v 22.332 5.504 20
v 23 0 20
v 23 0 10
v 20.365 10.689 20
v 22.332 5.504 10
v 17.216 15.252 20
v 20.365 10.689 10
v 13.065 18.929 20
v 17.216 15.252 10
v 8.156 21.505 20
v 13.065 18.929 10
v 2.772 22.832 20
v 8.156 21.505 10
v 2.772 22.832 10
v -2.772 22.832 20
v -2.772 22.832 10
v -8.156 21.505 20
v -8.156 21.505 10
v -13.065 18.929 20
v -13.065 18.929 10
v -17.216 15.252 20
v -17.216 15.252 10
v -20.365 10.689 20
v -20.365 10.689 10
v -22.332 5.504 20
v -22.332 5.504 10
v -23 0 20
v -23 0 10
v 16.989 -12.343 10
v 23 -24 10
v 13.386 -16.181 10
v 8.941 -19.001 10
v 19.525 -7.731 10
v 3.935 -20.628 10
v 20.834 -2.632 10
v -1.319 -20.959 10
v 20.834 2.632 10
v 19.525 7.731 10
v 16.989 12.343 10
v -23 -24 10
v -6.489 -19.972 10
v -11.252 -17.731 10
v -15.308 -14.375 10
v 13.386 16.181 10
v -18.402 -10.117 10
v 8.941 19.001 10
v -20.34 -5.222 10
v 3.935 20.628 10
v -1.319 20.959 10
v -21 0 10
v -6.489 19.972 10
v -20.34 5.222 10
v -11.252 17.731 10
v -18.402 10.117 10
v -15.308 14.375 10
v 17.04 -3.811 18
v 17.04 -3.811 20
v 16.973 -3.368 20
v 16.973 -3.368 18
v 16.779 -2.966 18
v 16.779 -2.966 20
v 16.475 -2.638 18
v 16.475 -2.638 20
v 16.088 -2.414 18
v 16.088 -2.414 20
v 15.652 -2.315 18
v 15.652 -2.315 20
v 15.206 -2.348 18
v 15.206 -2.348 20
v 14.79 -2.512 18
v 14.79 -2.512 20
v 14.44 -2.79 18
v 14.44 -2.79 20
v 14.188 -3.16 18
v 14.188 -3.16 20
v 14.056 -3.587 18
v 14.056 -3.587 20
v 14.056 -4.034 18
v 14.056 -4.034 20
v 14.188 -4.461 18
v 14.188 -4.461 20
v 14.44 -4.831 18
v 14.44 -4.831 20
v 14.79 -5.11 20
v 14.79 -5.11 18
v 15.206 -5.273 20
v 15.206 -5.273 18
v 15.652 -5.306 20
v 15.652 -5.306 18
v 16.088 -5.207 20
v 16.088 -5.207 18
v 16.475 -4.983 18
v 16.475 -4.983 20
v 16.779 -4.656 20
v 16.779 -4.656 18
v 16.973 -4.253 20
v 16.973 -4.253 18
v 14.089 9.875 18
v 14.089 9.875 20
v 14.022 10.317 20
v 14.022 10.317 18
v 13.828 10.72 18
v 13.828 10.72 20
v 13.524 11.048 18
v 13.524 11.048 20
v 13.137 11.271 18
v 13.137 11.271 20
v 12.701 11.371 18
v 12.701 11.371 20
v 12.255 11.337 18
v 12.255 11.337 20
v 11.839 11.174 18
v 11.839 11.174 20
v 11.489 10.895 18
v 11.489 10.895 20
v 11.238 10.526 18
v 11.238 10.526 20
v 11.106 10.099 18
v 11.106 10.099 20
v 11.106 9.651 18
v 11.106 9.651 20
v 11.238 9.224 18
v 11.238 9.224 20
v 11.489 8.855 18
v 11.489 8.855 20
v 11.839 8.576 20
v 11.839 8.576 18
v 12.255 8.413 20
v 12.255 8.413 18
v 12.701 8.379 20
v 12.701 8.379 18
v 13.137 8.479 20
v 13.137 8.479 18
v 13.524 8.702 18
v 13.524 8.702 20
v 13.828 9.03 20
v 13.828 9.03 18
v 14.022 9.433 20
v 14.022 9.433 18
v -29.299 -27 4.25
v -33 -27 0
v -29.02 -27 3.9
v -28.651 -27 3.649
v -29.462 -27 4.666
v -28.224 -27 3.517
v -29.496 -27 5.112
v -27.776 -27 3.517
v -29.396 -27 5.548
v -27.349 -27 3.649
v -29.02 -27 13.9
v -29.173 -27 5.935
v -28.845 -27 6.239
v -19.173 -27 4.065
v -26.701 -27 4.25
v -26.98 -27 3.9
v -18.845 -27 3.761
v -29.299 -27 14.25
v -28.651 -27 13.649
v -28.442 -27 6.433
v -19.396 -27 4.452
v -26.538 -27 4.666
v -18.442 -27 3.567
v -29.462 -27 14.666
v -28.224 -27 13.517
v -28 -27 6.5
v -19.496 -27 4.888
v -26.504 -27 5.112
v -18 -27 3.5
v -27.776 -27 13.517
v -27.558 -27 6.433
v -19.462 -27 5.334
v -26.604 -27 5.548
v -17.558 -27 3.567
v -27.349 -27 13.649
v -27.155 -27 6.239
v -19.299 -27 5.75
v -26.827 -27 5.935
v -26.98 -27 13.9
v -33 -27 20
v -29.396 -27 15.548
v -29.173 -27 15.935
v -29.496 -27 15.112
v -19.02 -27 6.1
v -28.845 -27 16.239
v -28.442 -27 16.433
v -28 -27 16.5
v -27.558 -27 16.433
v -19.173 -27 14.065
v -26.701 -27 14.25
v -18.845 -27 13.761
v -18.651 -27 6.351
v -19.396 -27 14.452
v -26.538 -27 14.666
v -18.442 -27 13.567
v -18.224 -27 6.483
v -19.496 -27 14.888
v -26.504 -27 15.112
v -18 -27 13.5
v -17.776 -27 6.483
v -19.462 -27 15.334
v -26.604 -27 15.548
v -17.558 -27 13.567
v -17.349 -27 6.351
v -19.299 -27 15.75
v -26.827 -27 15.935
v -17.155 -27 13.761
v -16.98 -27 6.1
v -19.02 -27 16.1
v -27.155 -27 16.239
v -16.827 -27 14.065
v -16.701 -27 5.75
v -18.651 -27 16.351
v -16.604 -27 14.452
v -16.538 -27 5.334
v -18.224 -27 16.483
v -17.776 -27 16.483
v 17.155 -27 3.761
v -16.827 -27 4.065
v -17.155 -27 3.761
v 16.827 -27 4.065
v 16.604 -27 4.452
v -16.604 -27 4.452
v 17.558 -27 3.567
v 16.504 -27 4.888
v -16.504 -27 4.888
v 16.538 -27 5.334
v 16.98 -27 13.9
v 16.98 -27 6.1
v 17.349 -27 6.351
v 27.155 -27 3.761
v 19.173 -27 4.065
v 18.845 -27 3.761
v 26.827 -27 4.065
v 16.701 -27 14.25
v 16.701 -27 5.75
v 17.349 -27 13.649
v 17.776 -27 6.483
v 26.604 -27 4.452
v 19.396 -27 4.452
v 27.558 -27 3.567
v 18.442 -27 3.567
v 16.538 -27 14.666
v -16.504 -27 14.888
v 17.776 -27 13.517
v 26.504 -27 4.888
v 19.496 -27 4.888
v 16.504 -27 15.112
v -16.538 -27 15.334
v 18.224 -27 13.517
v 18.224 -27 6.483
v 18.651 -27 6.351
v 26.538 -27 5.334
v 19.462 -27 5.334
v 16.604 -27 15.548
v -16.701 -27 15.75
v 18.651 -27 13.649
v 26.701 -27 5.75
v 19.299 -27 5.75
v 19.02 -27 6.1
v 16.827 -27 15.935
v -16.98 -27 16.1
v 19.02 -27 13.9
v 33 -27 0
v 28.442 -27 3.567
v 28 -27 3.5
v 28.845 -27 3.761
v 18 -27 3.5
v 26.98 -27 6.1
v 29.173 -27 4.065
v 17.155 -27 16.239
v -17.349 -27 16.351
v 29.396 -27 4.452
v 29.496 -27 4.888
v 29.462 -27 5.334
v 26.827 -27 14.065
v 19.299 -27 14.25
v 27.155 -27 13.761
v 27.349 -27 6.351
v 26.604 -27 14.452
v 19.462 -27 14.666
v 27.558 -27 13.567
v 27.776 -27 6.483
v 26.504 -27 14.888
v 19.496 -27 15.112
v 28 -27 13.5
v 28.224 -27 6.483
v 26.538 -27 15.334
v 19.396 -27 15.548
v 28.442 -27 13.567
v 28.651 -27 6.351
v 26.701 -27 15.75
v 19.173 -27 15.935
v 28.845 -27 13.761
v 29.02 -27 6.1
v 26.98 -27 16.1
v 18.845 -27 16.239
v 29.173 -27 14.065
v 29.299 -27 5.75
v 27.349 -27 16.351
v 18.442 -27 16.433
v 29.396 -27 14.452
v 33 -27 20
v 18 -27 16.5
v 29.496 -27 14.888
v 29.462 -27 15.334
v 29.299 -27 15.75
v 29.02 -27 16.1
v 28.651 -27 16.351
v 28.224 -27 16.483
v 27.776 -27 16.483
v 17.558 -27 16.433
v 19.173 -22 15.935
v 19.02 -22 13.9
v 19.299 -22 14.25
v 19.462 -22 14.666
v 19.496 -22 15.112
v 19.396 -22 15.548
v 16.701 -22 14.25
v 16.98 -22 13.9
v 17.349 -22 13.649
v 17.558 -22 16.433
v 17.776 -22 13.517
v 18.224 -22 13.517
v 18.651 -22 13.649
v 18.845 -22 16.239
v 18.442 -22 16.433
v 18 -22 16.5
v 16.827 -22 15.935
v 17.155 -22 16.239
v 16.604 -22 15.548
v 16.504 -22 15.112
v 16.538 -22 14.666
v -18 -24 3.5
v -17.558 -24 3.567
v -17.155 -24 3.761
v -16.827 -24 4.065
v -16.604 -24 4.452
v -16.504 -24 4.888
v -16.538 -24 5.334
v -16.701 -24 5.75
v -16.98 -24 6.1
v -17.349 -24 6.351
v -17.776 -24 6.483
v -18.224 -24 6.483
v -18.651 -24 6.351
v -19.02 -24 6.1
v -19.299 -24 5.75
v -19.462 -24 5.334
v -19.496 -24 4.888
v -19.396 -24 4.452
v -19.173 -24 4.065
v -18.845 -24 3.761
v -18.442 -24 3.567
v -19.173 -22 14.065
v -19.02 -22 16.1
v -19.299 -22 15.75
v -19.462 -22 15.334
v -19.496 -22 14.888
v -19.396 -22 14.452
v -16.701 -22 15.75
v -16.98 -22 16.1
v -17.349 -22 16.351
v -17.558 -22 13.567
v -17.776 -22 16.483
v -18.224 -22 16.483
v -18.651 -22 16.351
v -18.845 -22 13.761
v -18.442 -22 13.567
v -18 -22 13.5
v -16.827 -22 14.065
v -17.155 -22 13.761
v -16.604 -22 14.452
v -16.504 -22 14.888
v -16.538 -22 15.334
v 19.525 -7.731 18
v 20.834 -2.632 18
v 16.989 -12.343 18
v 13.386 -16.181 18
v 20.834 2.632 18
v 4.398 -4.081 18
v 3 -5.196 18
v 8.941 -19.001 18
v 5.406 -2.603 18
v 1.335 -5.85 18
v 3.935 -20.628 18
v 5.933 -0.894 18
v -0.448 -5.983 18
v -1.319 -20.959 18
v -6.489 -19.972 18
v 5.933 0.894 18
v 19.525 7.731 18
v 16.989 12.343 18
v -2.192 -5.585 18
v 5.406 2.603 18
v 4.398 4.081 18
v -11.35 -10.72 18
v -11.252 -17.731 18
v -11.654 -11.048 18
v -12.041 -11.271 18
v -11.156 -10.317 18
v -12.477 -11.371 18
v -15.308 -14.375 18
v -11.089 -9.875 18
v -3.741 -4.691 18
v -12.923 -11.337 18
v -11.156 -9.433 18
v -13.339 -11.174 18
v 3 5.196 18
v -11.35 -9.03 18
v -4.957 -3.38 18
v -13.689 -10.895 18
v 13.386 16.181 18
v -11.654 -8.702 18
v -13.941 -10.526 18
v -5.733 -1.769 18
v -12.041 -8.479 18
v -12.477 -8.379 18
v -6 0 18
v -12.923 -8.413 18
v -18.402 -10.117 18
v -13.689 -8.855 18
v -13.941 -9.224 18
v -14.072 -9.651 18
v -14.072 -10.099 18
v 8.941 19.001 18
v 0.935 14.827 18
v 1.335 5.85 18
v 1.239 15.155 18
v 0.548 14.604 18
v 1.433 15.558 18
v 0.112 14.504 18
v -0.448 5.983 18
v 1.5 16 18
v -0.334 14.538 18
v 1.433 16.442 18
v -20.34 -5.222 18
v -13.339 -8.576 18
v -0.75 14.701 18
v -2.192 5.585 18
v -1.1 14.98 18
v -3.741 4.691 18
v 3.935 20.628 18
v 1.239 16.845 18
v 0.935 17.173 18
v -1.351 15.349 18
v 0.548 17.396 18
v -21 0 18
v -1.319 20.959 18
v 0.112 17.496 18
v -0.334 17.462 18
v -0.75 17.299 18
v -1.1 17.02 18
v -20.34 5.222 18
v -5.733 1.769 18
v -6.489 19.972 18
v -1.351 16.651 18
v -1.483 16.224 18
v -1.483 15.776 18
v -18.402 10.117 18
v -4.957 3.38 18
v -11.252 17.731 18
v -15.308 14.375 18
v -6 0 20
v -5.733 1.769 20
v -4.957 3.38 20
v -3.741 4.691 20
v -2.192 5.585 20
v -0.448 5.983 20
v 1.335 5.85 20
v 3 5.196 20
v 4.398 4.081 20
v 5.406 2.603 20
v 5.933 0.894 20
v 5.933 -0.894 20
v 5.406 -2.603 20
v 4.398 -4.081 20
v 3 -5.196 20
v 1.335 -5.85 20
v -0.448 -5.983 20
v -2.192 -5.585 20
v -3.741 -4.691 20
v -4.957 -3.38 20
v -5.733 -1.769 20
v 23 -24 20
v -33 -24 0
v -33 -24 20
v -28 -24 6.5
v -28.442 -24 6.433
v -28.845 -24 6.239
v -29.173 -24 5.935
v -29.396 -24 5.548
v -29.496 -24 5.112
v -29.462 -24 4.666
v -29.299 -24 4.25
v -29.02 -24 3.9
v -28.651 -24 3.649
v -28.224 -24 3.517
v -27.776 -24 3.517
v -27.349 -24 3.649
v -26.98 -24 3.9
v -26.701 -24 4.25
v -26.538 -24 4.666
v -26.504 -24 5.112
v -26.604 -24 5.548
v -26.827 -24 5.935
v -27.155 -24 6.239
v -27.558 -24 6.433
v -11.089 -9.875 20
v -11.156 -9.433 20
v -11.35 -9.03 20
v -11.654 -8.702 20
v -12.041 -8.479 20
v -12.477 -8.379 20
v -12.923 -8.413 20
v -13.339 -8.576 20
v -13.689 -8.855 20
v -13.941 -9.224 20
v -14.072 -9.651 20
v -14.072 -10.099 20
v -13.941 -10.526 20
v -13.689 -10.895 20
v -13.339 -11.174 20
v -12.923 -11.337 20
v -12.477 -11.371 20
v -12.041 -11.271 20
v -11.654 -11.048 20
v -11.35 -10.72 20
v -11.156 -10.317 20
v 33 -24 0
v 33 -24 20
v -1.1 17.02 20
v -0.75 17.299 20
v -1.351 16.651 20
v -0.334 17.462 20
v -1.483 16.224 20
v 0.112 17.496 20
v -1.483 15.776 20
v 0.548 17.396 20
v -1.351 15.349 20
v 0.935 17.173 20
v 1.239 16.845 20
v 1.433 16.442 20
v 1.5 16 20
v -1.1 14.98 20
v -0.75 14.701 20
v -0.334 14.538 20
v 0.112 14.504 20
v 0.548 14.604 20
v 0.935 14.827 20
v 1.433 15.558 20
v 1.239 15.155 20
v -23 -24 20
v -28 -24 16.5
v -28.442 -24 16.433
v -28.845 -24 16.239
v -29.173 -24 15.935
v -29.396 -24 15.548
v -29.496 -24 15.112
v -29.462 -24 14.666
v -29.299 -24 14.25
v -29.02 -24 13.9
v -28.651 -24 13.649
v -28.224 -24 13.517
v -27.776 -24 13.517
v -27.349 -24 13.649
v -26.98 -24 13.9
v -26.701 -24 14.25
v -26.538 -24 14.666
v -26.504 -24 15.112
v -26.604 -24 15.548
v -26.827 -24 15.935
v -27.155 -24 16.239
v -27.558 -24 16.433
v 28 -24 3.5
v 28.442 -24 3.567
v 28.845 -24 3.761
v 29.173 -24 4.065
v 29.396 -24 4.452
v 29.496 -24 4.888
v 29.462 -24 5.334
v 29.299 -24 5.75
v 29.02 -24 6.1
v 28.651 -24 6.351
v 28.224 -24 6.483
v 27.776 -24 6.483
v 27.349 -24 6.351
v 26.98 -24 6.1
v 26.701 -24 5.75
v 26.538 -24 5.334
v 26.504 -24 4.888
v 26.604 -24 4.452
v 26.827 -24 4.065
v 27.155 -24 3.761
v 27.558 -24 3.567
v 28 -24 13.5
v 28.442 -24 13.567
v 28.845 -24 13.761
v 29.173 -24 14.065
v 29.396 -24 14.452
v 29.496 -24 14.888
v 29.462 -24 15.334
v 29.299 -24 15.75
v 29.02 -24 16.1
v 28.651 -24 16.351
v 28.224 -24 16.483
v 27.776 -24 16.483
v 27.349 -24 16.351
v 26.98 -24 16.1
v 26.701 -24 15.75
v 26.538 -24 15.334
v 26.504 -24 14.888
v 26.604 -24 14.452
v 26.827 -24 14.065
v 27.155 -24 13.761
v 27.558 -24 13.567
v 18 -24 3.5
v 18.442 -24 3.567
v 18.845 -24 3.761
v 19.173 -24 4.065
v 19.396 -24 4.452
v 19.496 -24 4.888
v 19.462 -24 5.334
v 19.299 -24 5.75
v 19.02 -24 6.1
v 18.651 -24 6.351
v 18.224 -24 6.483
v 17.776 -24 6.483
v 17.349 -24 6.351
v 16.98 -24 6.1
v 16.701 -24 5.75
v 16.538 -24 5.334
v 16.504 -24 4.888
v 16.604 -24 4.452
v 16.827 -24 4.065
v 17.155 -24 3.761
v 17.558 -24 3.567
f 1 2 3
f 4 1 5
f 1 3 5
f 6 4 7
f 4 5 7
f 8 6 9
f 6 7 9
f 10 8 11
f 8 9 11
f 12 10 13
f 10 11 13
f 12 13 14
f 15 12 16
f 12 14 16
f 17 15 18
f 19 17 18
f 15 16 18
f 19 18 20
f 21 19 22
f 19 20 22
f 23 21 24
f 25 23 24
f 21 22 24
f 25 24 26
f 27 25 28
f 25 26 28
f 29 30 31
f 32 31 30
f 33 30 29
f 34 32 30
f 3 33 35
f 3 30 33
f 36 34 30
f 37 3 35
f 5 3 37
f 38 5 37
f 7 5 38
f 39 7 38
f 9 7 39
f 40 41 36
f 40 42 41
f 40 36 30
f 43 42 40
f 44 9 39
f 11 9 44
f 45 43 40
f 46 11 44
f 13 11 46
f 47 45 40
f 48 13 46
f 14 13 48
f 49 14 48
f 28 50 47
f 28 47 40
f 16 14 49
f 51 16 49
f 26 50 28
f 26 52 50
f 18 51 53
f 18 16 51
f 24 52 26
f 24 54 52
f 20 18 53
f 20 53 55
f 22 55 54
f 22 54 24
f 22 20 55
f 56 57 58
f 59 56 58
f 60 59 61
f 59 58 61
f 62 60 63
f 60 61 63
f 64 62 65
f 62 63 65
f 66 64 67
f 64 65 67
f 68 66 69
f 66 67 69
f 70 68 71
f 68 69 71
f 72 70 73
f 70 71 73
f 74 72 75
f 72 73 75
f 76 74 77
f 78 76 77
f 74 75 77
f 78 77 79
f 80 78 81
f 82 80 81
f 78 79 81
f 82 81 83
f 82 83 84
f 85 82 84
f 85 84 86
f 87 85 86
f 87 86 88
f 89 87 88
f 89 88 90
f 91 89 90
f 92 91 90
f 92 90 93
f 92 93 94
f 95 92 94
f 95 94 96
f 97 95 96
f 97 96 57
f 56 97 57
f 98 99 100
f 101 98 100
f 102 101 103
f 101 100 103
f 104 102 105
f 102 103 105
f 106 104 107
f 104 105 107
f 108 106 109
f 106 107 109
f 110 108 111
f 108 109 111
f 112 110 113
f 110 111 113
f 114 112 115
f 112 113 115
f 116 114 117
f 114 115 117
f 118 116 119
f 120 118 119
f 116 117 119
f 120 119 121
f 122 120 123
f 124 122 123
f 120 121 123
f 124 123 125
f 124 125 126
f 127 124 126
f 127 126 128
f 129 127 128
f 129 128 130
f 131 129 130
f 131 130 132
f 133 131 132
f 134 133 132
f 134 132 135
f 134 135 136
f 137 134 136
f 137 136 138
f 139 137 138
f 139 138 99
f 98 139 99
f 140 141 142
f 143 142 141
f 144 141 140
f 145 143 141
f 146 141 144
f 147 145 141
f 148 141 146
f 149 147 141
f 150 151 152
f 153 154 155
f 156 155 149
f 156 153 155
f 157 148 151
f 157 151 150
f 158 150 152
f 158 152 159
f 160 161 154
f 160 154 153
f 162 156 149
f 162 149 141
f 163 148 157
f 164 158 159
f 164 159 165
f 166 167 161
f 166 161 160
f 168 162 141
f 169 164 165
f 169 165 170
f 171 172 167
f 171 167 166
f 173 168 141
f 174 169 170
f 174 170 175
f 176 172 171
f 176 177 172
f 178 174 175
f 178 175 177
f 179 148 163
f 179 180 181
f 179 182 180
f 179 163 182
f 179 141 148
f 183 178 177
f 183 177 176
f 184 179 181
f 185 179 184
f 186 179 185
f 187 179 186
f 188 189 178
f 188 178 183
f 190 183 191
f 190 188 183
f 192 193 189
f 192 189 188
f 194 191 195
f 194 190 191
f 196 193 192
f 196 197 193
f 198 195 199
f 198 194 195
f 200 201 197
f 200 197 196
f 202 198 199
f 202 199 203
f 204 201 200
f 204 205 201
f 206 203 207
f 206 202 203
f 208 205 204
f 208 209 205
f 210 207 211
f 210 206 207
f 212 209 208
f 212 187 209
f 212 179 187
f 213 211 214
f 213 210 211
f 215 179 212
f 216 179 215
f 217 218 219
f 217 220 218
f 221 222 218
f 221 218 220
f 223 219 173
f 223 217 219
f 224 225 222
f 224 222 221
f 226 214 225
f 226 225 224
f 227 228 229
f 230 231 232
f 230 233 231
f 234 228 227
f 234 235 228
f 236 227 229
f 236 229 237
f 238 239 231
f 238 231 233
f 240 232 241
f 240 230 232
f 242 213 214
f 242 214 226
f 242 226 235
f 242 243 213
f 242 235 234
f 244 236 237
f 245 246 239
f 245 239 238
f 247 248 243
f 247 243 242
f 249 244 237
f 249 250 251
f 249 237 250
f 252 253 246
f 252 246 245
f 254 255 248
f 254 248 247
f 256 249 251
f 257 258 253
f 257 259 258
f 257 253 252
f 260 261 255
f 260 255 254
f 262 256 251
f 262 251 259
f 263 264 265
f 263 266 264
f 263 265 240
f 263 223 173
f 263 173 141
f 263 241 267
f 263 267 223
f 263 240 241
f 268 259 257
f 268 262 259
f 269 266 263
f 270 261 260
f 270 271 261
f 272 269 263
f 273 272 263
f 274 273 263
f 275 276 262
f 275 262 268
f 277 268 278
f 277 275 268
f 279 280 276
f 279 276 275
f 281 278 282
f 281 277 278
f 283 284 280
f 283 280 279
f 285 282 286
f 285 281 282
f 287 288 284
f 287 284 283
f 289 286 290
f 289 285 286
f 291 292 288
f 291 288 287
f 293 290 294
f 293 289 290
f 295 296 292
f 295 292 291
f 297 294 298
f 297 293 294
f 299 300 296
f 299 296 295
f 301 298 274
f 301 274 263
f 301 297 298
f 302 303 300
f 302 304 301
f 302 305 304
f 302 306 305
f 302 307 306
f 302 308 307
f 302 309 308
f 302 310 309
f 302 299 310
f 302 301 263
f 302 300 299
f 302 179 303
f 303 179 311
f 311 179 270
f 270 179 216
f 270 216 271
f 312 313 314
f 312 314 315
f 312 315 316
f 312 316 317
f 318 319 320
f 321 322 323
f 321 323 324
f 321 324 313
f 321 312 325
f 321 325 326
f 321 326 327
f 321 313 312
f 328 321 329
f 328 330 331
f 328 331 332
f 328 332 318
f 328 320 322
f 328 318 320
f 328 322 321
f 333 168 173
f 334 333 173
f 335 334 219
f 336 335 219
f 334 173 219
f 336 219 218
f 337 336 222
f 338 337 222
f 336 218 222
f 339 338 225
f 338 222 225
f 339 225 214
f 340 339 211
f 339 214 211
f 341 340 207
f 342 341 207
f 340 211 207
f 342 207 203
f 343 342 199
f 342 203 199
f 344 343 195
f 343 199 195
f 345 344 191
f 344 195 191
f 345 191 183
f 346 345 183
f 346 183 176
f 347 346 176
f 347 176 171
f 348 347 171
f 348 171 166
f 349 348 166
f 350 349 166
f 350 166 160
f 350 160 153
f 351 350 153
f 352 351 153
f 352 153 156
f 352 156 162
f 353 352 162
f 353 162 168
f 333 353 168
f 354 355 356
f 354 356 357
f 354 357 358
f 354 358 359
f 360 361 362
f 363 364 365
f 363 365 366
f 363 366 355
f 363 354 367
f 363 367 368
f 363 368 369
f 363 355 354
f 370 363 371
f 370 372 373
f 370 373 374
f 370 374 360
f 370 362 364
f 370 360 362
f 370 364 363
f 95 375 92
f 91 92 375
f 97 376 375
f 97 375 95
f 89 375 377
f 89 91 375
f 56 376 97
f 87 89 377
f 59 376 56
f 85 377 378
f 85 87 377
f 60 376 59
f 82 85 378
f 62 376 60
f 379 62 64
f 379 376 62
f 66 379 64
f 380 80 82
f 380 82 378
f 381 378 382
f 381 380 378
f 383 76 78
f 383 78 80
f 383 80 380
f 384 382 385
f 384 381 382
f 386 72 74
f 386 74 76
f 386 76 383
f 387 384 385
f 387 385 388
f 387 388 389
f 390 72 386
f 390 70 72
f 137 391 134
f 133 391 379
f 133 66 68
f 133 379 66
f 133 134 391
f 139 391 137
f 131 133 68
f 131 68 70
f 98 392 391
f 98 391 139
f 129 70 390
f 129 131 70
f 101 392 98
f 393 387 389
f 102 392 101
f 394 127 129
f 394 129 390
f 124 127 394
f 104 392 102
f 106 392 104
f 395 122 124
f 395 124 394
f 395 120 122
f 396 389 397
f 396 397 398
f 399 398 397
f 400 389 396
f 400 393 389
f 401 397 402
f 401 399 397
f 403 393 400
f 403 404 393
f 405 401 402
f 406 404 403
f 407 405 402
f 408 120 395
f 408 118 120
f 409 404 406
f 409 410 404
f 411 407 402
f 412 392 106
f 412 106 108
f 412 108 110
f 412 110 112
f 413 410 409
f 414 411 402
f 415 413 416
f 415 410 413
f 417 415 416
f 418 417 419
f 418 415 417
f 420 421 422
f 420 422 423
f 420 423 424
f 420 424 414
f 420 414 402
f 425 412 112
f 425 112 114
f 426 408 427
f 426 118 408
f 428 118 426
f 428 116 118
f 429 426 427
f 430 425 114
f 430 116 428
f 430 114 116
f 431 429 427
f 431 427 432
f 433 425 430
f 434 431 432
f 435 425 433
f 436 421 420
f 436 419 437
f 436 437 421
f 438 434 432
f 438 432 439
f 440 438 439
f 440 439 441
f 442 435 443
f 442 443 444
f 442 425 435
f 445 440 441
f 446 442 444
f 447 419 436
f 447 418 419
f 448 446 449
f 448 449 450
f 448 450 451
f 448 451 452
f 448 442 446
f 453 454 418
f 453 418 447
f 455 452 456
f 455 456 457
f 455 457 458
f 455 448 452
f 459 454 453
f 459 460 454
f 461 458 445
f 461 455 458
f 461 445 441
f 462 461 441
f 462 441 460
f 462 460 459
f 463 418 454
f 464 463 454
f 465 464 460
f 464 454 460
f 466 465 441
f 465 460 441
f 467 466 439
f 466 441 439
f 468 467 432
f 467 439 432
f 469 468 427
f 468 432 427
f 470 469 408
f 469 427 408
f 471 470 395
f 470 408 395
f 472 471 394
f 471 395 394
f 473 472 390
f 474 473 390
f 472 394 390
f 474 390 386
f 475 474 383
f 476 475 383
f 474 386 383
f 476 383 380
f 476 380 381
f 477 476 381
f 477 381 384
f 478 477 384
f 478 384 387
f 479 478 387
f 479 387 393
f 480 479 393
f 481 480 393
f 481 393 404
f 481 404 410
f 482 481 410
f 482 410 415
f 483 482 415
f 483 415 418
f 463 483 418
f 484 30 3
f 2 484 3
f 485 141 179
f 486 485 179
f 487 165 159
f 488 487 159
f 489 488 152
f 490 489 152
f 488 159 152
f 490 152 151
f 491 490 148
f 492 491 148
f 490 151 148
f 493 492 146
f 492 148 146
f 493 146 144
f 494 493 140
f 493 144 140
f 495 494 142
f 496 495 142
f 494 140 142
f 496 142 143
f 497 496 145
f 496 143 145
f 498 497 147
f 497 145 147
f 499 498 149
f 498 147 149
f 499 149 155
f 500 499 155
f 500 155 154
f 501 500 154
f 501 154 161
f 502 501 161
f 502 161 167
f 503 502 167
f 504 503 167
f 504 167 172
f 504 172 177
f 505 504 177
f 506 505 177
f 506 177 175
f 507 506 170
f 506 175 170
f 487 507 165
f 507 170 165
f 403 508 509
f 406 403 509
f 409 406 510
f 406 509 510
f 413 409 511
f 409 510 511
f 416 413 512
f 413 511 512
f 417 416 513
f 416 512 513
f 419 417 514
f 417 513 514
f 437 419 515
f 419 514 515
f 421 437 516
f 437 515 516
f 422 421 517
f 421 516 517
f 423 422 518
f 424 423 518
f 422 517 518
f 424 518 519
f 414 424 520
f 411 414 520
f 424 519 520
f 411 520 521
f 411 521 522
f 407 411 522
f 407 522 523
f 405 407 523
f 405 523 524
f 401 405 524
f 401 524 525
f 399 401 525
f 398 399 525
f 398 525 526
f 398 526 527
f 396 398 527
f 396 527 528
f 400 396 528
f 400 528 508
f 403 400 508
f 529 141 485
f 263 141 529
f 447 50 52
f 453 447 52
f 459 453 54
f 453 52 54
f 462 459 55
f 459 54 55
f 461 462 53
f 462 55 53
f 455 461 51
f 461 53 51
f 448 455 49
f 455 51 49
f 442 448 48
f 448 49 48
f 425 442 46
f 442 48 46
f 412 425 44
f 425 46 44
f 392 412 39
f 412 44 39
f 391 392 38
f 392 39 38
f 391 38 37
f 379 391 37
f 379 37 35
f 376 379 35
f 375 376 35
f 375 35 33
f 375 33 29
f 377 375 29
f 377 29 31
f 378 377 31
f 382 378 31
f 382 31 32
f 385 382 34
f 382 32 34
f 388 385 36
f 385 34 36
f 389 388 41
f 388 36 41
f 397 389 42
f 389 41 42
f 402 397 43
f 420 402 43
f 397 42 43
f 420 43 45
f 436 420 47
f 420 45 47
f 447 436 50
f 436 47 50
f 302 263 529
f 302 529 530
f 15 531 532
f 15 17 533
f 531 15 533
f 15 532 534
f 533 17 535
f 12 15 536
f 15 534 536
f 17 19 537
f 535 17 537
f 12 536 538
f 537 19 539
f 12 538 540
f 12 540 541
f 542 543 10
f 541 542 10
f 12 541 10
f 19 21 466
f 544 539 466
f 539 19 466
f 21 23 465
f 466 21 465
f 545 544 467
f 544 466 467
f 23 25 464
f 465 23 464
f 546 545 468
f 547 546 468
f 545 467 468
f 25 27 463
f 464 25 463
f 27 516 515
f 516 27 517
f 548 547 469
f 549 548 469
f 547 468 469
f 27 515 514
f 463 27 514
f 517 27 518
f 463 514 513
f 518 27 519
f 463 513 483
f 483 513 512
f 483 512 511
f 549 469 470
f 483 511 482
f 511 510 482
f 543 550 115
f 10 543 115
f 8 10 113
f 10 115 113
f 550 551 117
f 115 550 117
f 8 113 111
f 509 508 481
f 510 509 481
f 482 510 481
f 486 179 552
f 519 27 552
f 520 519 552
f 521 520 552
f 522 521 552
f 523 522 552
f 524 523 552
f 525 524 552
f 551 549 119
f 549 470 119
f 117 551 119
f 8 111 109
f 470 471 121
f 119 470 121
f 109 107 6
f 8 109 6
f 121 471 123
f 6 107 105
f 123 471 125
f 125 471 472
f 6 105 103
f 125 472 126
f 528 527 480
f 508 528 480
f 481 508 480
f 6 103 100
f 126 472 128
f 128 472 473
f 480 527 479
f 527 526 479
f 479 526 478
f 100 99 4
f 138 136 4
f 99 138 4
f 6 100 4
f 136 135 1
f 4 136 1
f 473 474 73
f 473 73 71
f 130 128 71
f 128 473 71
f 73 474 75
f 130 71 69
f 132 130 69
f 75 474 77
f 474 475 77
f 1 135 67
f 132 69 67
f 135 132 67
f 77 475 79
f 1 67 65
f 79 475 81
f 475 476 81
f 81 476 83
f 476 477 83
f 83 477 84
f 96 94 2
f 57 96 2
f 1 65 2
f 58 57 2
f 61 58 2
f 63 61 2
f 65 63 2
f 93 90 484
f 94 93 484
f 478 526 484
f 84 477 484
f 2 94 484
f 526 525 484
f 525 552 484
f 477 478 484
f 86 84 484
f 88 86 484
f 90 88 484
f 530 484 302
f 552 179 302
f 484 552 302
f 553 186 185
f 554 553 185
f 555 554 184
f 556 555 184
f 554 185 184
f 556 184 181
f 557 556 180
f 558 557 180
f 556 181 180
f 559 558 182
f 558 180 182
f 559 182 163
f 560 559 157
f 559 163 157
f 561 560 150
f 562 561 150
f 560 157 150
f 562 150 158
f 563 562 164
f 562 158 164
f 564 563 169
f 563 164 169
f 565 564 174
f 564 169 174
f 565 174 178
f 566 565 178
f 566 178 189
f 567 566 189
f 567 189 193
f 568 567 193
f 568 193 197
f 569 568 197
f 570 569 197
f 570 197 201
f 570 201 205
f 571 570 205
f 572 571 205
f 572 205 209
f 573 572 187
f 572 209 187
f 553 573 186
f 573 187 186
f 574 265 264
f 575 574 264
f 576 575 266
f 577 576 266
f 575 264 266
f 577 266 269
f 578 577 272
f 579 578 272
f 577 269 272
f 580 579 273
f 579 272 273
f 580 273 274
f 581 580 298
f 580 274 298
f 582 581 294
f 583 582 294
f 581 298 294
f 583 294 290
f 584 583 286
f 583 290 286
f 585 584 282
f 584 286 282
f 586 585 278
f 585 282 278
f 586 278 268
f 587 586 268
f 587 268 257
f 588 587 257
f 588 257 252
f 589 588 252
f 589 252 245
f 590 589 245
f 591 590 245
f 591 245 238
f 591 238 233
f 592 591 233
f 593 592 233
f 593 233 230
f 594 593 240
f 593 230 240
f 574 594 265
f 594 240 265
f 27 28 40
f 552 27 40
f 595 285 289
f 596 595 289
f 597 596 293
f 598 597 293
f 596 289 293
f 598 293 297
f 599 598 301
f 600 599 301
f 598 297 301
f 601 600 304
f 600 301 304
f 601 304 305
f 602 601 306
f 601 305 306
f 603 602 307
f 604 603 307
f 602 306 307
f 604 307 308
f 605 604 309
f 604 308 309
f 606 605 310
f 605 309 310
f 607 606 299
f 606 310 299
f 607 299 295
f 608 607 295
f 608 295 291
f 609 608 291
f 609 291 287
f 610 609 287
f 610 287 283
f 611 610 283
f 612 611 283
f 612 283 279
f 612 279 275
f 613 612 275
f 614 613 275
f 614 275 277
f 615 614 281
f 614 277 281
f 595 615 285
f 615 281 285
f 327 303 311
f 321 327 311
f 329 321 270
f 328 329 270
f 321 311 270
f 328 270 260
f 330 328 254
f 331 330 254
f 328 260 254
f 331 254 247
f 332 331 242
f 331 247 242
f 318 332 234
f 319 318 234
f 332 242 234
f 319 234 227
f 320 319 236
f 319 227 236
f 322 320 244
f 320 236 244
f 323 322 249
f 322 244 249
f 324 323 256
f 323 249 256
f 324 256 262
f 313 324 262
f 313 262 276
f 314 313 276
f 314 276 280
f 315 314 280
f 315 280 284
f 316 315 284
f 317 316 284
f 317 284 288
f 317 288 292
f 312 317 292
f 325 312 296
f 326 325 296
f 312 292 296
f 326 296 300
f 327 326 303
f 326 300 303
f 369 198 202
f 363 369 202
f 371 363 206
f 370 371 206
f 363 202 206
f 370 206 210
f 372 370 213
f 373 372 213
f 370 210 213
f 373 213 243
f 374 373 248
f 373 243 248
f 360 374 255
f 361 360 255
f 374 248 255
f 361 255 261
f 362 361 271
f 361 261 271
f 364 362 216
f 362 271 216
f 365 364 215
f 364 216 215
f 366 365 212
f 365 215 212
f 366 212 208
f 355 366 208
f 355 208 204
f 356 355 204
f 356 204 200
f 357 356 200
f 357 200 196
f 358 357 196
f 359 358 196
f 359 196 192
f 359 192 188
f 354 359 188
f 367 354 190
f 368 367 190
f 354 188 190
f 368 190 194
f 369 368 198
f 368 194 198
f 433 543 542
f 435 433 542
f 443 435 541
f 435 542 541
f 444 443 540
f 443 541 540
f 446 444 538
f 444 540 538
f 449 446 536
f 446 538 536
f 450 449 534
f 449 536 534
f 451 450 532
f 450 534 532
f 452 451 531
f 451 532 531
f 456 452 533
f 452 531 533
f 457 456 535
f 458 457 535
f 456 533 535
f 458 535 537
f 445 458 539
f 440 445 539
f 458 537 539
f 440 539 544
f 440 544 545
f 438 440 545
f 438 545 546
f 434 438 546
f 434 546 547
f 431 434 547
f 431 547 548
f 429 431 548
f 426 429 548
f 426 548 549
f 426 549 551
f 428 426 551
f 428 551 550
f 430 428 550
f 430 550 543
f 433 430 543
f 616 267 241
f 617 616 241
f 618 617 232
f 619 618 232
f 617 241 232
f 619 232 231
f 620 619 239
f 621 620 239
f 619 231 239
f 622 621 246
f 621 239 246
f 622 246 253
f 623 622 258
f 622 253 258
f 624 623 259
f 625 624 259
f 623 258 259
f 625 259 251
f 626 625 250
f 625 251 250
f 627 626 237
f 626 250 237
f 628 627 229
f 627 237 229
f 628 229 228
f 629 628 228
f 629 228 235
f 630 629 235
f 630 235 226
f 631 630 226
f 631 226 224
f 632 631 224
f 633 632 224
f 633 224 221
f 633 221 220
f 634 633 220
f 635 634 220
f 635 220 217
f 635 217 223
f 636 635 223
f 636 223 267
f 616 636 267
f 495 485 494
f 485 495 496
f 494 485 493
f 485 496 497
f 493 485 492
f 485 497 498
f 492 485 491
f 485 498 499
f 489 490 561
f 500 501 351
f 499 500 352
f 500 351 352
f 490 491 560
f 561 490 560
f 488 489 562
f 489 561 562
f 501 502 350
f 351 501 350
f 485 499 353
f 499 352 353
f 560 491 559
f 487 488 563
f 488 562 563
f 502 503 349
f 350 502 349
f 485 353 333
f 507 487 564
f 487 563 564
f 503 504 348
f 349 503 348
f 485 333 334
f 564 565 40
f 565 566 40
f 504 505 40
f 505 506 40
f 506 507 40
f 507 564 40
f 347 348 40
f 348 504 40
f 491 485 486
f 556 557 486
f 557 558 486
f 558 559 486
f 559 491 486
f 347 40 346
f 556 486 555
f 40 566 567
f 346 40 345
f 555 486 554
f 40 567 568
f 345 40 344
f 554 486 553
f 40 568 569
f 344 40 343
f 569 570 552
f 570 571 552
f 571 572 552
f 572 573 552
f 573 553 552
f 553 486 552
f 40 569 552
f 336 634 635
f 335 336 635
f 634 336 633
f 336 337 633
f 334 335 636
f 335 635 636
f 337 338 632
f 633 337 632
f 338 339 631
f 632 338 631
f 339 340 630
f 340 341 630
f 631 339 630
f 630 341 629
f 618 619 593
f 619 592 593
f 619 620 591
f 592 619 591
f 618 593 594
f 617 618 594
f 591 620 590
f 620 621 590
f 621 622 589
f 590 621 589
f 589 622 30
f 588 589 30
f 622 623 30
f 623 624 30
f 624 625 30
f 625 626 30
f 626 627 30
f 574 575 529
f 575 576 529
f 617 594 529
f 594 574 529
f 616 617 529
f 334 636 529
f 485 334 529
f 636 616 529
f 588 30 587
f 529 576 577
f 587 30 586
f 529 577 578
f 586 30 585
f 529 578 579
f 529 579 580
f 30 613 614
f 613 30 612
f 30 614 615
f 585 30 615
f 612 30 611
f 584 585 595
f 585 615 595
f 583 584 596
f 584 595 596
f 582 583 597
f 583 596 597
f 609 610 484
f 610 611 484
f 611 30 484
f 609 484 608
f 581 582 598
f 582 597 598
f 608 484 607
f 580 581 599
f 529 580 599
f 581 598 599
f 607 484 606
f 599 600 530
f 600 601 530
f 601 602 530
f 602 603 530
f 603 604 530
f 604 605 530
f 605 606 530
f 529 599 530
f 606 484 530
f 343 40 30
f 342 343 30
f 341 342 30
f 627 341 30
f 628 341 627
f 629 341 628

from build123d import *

# Parameters (mm, degrees)
EXTRUDE_1_DEPTH     = 20
CUT_EXTRUDE_1_DEPTH = 10
SKETCH_3_R          = 21
CUT_EXTRUDE_2_DEPTH = 8
SKETCH_6_R          = 1.5
CUT_EXTRUDE_3_DEPTH = 5
SKETCH_7_R          = 1.5
CUT_EXTRUDE_6_DEPTH = 3
SKETCH_8_R          = 6
CUT_EXTRUDE_7_DEPTH = 3
SKETCH_9_W          = 10
SKETCH_9_H          = 20
SKETCH_9_R          = 1.5
EXTRUDE_2_DEPTH     = 3


with BuildPart() as part:
    # 草图1 → 凸台-拉伸1 (new body)
    with BuildSketch(Plane.XY):
        with BuildLine():
            Line((-23, 0), (-23, -27))
            Line((-23, -27), (23, -27))
            Line((23, -27), (23, 0))
            ThreePointArc((23, 0), (0, 23), (-23, 0))
        make_face()
    extrude(amount=EXTRUDE_1_DEPTH)

    # 草图2 → 切除-拉伸1 (cut)
    with BuildSketch(Plane(origin=(0, 0, 0), x_dir=(-1, 0, 0), z_dir=(0, 0, -1))):
        with BuildLine():
            Line((-23, -24), (23, -24))
            Line((23, -24), (23, 0))
            ThreePointArc((23, 0), (0, 23), (-23, 0))
            Line((-23, 0), (-23, -24))
        make_face()
    extrude(amount=-CUT_EXTRUDE_1_DEPTH, mode=Mode.SUBTRACT)

    # 草图3 → 切除-拉伸2 (cut)
    with BuildSketch(Plane(origin=(0, 0, 10), x_dir=(-1, 0, 0), z_dir=(0, 0, -1))):
        Circle(SKETCH_3_R)
    extrude(amount=-CUT_EXTRUDE_2_DEPTH, mode=Mode.SUBTRACT)

    # 草图6 → 切除-拉伸3 (cut)
    with BuildSketch(Plane.XZ.offset(27)):
        with Locations(Location((-18, 15, 0), (0, 0, 270))):
            Circle(SKETCH_6_R)
        with Locations(Location((18, 15, 0), (0, 0, 90))):
            Circle(SKETCH_6_R)
        with Locations(Location((18, 5, 0), (0, 0, 270))):
            Circle(SKETCH_6_R)
        with Locations(Location((-18, 5, 0), (0, 0, 270))):
            Circle(SKETCH_6_R)
    extrude(amount=-CUT_EXTRUDE_3_DEPTH, mode=Mode.SUBTRACT)

    # 草图7 → 切除-拉伸6 (cut)
    with BuildSketch(Plane.XY.offset(20)):
        with Locations((0, 16)):
            Circle(SKETCH_7_R)
        with Locations((12.589057749, 9.875)):
            Circle(SKETCH_7_R)
        with Locations((-12.589057749, -9.875)):
            Circle(SKETCH_7_R)
        with Locations((15.539618159, -3.810546875)):
            Circle(SKETCH_7_R)
    extrude(amount=-CUT_EXTRUDE_6_DEPTH, mode=Mode.SUBTRACT)

    # 草图8 → 切除-拉伸7 (cut)
    with BuildSketch(Plane(origin=(0, 0, 18), x_dir=(-1, 0, 0), z_dir=(0, 0, -1))):
        Circle(SKETCH_8_R)
    extrude(amount=-CUT_EXTRUDE_7_DEPTH, mode=Mode.SUBTRACT)

    # 草图9 → 凸台-拉伸2 (add)
    # profile 1 of 2: a face of its own
    with BuildSketch(Plane.XZ.offset(27)):
        with Locations((28, 10)):
            Rectangle(SKETCH_9_W, SKETCH_9_H)
        with Locations(Location((28, 15, 0), (0, 0, 270))):
            Circle(SKETCH_9_R, mode=Mode.SUBTRACT)
        with Locations(Location((28, 5, 0), (0, 0, 270))):
            Circle(SKETCH_9_R, mode=Mode.SUBTRACT)
    # profile 2 of 2: a face of its own
    with BuildSketch(Plane.XZ.offset(27)):
        with Locations((-28, 10)):
            Rectangle(SKETCH_9_W, SKETCH_9_H)
        with Locations(Location((-28, 15, 0), (0, 0, 90))):
            Circle(SKETCH_9_R, mode=Mode.SUBTRACT)
        with Locations(Location((-28, 5, 0), (0, 0, 90))):
            Circle(SKETCH_9_R, mode=Mode.SUBTRACT)
    extrude(amount=-EXTRUDE_2_DEPTH)


solid = part.part
